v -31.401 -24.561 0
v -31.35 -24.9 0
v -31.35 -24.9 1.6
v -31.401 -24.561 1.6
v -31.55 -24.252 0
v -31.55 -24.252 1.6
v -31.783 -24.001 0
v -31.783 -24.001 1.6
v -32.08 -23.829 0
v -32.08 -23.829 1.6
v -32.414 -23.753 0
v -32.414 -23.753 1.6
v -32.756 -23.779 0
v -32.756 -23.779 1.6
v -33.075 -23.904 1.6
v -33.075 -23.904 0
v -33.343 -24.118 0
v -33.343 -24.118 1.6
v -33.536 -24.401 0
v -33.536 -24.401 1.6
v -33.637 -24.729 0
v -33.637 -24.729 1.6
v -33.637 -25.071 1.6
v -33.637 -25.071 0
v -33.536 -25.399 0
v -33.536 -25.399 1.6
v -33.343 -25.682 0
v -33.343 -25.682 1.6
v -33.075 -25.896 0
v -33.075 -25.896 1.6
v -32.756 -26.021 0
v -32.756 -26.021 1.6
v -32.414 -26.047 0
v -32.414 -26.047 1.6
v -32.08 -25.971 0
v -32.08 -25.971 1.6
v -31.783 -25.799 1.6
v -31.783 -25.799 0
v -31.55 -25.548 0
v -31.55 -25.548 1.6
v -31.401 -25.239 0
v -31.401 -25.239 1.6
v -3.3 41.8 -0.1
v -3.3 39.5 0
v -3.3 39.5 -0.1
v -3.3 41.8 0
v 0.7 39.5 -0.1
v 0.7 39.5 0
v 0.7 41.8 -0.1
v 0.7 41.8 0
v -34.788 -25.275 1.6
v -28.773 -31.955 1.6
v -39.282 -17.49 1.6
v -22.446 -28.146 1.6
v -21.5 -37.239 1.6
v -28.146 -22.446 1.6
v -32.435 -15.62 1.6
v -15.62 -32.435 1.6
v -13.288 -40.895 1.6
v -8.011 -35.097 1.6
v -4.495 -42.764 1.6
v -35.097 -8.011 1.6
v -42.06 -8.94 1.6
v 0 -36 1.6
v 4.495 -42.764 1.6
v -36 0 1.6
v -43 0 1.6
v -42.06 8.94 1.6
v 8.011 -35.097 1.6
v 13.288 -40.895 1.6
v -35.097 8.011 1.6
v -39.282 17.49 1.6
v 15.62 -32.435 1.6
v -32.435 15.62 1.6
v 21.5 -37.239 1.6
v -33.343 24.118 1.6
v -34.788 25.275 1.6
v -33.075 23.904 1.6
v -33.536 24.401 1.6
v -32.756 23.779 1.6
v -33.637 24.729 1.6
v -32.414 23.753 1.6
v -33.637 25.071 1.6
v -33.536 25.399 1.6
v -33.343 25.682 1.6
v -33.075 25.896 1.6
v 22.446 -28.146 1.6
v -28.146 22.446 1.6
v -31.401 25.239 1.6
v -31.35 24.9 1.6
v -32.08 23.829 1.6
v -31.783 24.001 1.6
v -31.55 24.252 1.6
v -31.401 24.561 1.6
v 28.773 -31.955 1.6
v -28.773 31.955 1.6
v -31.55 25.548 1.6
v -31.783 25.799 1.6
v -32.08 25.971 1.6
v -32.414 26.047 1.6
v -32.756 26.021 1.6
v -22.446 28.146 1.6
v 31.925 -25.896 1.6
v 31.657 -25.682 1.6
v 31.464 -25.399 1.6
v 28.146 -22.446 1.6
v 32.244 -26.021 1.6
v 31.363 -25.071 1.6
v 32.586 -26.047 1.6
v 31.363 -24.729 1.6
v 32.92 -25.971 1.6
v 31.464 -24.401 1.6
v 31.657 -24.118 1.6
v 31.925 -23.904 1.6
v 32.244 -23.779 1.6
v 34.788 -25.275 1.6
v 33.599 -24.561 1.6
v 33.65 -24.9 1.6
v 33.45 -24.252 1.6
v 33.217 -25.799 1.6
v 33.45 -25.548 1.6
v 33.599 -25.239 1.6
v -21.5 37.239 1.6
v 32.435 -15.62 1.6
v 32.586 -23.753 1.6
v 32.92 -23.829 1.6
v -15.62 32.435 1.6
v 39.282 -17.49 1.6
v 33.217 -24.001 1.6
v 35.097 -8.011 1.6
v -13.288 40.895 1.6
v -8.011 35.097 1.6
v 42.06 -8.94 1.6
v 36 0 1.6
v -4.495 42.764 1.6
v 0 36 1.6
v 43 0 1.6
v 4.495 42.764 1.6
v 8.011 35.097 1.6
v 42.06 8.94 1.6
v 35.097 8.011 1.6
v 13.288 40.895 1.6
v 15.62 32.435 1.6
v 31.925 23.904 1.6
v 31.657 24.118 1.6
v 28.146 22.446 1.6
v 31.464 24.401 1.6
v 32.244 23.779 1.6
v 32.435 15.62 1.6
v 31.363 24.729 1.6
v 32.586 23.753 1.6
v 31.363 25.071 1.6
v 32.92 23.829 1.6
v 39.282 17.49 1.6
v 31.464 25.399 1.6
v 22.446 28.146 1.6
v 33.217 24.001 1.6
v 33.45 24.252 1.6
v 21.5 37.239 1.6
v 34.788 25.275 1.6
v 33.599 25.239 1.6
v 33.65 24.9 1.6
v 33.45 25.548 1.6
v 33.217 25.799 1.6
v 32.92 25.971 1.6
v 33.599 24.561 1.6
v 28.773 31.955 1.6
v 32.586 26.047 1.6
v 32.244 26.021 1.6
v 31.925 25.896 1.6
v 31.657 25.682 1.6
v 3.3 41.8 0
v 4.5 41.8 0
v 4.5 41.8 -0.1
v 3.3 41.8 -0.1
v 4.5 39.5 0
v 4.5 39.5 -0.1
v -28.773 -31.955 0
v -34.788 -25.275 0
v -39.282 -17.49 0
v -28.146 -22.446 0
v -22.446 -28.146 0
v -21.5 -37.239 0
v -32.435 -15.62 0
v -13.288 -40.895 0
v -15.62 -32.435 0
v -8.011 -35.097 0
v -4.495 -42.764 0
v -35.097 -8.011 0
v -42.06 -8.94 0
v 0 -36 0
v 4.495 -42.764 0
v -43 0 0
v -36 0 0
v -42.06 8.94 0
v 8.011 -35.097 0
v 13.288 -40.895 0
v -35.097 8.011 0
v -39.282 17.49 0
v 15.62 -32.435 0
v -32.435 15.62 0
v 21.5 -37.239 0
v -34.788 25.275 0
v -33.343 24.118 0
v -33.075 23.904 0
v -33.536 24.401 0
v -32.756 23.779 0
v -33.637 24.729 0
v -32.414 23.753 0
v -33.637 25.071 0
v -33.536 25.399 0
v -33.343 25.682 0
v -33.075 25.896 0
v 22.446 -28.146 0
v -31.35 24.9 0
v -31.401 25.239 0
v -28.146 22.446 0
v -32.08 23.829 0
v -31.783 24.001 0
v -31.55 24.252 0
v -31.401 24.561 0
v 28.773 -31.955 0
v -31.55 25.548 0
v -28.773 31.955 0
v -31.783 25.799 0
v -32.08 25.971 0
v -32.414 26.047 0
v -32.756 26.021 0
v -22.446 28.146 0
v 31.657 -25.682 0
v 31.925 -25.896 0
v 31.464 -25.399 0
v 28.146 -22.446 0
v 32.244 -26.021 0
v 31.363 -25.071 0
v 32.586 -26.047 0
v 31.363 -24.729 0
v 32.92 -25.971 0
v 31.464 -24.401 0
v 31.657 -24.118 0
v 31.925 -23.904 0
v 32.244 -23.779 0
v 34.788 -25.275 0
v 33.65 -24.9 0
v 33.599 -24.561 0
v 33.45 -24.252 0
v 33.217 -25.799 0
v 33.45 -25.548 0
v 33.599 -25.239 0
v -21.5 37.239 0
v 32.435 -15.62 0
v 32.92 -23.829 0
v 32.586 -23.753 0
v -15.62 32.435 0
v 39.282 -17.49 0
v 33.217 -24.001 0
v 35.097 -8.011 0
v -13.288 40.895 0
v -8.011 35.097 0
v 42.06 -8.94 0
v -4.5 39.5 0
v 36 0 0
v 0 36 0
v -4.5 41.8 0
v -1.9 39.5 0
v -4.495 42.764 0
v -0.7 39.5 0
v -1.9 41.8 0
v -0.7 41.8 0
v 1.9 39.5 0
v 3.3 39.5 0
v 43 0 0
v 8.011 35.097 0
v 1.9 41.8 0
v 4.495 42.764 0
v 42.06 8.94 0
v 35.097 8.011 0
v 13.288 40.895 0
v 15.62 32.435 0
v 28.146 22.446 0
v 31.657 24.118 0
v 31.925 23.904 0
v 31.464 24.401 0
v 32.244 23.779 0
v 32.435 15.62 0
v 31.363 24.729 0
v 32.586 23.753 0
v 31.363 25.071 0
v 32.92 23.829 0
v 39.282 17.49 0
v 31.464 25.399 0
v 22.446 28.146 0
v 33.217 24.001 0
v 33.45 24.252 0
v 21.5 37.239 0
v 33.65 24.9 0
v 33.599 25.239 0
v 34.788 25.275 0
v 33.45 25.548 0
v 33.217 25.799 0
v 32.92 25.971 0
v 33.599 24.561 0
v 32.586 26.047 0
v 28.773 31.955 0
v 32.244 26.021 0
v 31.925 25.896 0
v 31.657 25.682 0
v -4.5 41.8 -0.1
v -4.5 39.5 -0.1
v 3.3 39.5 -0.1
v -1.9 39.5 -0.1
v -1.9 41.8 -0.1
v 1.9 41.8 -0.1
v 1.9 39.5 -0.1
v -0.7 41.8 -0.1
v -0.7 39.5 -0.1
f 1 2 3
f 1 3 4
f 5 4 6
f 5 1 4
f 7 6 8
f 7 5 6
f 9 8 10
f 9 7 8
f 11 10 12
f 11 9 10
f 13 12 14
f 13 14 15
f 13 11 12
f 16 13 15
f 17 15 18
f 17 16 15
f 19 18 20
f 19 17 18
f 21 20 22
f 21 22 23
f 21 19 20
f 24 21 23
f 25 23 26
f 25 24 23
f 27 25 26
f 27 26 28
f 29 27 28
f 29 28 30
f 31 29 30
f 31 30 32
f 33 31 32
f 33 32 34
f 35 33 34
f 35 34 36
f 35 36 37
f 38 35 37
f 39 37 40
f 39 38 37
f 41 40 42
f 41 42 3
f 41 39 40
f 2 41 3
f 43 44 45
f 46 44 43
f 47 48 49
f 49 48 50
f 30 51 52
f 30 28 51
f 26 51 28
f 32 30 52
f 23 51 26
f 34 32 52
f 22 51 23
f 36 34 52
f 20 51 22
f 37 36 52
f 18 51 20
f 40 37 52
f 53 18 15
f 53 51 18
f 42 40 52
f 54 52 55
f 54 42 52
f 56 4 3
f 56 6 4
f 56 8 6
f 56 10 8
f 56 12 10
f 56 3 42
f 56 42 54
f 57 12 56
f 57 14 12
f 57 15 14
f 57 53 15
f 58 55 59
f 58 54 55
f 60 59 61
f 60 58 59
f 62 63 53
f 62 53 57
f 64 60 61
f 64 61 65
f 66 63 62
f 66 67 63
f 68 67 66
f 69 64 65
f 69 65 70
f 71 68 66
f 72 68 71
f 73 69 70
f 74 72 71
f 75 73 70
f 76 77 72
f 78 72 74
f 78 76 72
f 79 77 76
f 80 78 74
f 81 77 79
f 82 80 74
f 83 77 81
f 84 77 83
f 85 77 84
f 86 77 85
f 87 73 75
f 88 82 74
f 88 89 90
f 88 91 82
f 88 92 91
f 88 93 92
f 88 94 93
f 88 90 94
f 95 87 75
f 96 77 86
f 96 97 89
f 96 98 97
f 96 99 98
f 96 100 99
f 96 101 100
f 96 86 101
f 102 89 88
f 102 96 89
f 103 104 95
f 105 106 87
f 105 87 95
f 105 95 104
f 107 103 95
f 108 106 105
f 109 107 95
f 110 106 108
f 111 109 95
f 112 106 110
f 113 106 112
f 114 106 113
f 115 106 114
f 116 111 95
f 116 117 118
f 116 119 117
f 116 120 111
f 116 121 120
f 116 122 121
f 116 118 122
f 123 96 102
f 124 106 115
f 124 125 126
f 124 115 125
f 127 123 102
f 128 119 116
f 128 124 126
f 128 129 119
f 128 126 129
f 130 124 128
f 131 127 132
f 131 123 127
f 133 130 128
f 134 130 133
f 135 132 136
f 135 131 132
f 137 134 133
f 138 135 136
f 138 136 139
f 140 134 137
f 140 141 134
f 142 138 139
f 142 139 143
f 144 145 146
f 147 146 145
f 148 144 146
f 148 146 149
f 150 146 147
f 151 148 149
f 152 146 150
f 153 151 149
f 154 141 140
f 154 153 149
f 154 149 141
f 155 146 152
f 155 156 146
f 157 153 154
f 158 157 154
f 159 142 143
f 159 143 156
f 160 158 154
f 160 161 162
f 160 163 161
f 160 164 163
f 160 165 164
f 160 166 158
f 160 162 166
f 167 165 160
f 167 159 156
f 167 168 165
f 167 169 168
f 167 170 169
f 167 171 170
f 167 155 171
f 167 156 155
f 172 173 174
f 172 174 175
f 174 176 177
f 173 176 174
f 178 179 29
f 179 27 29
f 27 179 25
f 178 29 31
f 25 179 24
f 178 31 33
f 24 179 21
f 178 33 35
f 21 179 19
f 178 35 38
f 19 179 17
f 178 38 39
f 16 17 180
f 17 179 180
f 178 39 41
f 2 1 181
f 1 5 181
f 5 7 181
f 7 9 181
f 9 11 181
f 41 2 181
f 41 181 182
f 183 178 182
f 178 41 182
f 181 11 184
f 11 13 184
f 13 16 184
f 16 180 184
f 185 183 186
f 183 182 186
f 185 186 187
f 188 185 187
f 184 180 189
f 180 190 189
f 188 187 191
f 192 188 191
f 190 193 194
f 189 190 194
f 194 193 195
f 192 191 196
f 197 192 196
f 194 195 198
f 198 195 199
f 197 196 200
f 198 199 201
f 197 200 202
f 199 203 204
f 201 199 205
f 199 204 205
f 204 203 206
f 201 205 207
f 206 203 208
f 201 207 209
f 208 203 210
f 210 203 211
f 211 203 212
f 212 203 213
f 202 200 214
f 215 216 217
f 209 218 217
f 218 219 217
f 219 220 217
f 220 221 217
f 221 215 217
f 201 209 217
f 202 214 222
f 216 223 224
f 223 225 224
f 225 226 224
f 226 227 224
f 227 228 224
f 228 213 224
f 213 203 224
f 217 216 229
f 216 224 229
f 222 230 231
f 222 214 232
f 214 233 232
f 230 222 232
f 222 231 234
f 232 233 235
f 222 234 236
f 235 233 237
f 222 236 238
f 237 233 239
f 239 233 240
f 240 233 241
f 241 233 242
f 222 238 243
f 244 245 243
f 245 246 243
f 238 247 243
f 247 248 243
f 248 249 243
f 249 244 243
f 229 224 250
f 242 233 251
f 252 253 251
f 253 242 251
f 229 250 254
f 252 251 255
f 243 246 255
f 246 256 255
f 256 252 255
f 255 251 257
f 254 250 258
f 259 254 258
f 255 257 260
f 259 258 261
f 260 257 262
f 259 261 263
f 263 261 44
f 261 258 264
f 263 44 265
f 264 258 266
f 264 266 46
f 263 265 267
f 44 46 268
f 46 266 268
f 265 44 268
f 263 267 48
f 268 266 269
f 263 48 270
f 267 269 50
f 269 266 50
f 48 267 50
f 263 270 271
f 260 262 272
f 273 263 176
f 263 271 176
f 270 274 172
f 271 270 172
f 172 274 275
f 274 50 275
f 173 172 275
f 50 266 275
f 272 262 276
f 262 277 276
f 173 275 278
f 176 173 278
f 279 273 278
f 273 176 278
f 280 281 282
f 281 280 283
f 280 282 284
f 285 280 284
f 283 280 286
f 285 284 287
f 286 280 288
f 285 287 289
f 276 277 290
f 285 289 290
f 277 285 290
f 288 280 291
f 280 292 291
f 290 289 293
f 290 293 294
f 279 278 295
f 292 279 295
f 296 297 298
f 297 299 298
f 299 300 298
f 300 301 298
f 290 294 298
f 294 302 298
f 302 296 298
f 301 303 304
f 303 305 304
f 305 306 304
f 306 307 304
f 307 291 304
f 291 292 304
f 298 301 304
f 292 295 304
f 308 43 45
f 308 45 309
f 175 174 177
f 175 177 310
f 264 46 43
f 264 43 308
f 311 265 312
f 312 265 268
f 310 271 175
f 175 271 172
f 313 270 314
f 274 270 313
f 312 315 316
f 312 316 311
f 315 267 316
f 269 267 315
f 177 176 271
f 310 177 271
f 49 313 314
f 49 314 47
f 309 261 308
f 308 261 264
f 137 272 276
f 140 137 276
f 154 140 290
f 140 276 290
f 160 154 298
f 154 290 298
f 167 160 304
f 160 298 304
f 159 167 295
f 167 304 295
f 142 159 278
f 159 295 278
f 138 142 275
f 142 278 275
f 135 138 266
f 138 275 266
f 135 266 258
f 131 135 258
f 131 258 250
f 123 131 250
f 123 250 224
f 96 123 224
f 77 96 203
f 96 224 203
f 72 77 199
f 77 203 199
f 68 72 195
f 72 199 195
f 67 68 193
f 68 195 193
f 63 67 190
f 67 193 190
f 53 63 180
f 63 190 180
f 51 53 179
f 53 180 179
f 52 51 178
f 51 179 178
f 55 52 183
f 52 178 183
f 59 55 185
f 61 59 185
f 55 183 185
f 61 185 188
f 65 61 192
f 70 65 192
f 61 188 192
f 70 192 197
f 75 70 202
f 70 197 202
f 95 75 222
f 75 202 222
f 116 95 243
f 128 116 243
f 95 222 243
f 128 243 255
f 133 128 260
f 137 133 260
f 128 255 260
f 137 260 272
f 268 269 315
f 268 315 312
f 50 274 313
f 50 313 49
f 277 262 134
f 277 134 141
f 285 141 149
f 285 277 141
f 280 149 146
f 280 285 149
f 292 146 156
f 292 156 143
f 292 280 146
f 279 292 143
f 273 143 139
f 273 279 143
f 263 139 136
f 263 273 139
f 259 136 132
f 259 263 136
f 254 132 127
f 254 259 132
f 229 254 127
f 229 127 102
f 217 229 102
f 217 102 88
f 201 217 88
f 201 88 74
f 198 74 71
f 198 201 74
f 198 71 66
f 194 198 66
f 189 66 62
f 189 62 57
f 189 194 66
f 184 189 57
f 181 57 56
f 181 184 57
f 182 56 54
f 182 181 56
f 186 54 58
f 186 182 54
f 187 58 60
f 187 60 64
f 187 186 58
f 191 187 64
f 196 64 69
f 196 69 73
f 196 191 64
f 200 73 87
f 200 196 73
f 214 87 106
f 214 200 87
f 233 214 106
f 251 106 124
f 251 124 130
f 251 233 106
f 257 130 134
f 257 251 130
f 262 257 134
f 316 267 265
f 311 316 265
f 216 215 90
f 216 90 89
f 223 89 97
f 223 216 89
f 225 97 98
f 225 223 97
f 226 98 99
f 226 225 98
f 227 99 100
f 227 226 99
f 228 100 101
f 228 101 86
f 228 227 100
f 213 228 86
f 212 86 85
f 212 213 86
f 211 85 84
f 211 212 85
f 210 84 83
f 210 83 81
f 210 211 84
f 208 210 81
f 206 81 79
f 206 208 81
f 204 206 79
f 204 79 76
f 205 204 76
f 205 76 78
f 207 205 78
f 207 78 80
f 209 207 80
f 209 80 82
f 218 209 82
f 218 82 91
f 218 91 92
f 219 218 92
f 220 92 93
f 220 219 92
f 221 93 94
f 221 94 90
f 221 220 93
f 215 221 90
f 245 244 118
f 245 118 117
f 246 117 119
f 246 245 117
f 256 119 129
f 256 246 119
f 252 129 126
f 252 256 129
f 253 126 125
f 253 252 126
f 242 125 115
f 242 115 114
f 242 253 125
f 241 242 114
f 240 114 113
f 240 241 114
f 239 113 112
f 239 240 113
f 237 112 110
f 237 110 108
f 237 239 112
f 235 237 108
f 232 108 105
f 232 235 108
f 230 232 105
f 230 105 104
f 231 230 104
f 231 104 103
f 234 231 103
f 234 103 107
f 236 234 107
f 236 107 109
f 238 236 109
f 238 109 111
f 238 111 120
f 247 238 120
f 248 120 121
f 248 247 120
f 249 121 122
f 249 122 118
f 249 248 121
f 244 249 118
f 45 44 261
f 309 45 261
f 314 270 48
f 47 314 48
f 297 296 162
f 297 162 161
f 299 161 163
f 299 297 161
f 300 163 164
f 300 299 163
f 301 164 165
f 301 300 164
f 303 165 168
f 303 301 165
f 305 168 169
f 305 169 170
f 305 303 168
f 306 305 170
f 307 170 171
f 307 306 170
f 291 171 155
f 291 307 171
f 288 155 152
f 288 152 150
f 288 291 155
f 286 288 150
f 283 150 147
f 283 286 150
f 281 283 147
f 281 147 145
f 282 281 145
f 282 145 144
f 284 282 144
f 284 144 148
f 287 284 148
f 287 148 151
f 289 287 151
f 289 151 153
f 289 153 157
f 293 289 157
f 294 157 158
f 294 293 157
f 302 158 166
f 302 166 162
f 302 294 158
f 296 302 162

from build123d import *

# Parameters (mm, degrees)
SKETCH1_R           = 43
SKETCH1_R_2         = 36
SKETCH1_R_3         = 1.15
BOSS_EXTRUDE2_DEPTH = 1.6
SKETCH4_W           = 1.2
SKETCH4_H           = 2.3
BOSS_EXTRUDE3_DEPTH = 0.1


with BuildPart() as part:
    # Sketch1 → Boss-Extrude2 (new body)
    with BuildSketch(Plane.XY):
        Circle(SKETCH1_R)
        Circle(SKETCH1_R_2, mode=Mode.SUBTRACT)
        with Locations((32.5, -24.9)):
            Circle(SKETCH1_R_3, mode=Mode.SUBTRACT)
        with Locations((-32.5, -24.9)):
            Circle(SKETCH1_R_3, mode=Mode.SUBTRACT)
        with Locations((-32.5, 24.9)):
            Circle(SKETCH1_R_3, mode=Mode.SUBTRACT)
        with Locations((32.5, 24.9)):
            Circle(SKETCH1_R_3, mode=Mode.SUBTRACT)
    extrude(amount=BOSS_EXTRUDE2_DEPTH)

    # Sketch4 → Boss-Extrude3 (add)
    with BuildSketch(Plane(origin=(0, 0, 0), x_dir=(-1, 0, 0), z_dir=(0, 0, -1))):
        with Locations((1.3, 40.65)):
            Rectangle(SKETCH4_W, SKETCH4_H)
        with Locations((3.9, 40.65)):
            Rectangle(SKETCH4_W, SKETCH4_H)
        with Locations((-1.3, 40.65)):
            Rectangle(SKETCH4_W, SKETCH4_H)
        with Locations((-3.9, 40.65)):
            Rectangle(SKETCH4_W, SKETCH4_H)
    extrude(amount=BOSS_EXTRUDE3_DEPTH)


solid = part.part
